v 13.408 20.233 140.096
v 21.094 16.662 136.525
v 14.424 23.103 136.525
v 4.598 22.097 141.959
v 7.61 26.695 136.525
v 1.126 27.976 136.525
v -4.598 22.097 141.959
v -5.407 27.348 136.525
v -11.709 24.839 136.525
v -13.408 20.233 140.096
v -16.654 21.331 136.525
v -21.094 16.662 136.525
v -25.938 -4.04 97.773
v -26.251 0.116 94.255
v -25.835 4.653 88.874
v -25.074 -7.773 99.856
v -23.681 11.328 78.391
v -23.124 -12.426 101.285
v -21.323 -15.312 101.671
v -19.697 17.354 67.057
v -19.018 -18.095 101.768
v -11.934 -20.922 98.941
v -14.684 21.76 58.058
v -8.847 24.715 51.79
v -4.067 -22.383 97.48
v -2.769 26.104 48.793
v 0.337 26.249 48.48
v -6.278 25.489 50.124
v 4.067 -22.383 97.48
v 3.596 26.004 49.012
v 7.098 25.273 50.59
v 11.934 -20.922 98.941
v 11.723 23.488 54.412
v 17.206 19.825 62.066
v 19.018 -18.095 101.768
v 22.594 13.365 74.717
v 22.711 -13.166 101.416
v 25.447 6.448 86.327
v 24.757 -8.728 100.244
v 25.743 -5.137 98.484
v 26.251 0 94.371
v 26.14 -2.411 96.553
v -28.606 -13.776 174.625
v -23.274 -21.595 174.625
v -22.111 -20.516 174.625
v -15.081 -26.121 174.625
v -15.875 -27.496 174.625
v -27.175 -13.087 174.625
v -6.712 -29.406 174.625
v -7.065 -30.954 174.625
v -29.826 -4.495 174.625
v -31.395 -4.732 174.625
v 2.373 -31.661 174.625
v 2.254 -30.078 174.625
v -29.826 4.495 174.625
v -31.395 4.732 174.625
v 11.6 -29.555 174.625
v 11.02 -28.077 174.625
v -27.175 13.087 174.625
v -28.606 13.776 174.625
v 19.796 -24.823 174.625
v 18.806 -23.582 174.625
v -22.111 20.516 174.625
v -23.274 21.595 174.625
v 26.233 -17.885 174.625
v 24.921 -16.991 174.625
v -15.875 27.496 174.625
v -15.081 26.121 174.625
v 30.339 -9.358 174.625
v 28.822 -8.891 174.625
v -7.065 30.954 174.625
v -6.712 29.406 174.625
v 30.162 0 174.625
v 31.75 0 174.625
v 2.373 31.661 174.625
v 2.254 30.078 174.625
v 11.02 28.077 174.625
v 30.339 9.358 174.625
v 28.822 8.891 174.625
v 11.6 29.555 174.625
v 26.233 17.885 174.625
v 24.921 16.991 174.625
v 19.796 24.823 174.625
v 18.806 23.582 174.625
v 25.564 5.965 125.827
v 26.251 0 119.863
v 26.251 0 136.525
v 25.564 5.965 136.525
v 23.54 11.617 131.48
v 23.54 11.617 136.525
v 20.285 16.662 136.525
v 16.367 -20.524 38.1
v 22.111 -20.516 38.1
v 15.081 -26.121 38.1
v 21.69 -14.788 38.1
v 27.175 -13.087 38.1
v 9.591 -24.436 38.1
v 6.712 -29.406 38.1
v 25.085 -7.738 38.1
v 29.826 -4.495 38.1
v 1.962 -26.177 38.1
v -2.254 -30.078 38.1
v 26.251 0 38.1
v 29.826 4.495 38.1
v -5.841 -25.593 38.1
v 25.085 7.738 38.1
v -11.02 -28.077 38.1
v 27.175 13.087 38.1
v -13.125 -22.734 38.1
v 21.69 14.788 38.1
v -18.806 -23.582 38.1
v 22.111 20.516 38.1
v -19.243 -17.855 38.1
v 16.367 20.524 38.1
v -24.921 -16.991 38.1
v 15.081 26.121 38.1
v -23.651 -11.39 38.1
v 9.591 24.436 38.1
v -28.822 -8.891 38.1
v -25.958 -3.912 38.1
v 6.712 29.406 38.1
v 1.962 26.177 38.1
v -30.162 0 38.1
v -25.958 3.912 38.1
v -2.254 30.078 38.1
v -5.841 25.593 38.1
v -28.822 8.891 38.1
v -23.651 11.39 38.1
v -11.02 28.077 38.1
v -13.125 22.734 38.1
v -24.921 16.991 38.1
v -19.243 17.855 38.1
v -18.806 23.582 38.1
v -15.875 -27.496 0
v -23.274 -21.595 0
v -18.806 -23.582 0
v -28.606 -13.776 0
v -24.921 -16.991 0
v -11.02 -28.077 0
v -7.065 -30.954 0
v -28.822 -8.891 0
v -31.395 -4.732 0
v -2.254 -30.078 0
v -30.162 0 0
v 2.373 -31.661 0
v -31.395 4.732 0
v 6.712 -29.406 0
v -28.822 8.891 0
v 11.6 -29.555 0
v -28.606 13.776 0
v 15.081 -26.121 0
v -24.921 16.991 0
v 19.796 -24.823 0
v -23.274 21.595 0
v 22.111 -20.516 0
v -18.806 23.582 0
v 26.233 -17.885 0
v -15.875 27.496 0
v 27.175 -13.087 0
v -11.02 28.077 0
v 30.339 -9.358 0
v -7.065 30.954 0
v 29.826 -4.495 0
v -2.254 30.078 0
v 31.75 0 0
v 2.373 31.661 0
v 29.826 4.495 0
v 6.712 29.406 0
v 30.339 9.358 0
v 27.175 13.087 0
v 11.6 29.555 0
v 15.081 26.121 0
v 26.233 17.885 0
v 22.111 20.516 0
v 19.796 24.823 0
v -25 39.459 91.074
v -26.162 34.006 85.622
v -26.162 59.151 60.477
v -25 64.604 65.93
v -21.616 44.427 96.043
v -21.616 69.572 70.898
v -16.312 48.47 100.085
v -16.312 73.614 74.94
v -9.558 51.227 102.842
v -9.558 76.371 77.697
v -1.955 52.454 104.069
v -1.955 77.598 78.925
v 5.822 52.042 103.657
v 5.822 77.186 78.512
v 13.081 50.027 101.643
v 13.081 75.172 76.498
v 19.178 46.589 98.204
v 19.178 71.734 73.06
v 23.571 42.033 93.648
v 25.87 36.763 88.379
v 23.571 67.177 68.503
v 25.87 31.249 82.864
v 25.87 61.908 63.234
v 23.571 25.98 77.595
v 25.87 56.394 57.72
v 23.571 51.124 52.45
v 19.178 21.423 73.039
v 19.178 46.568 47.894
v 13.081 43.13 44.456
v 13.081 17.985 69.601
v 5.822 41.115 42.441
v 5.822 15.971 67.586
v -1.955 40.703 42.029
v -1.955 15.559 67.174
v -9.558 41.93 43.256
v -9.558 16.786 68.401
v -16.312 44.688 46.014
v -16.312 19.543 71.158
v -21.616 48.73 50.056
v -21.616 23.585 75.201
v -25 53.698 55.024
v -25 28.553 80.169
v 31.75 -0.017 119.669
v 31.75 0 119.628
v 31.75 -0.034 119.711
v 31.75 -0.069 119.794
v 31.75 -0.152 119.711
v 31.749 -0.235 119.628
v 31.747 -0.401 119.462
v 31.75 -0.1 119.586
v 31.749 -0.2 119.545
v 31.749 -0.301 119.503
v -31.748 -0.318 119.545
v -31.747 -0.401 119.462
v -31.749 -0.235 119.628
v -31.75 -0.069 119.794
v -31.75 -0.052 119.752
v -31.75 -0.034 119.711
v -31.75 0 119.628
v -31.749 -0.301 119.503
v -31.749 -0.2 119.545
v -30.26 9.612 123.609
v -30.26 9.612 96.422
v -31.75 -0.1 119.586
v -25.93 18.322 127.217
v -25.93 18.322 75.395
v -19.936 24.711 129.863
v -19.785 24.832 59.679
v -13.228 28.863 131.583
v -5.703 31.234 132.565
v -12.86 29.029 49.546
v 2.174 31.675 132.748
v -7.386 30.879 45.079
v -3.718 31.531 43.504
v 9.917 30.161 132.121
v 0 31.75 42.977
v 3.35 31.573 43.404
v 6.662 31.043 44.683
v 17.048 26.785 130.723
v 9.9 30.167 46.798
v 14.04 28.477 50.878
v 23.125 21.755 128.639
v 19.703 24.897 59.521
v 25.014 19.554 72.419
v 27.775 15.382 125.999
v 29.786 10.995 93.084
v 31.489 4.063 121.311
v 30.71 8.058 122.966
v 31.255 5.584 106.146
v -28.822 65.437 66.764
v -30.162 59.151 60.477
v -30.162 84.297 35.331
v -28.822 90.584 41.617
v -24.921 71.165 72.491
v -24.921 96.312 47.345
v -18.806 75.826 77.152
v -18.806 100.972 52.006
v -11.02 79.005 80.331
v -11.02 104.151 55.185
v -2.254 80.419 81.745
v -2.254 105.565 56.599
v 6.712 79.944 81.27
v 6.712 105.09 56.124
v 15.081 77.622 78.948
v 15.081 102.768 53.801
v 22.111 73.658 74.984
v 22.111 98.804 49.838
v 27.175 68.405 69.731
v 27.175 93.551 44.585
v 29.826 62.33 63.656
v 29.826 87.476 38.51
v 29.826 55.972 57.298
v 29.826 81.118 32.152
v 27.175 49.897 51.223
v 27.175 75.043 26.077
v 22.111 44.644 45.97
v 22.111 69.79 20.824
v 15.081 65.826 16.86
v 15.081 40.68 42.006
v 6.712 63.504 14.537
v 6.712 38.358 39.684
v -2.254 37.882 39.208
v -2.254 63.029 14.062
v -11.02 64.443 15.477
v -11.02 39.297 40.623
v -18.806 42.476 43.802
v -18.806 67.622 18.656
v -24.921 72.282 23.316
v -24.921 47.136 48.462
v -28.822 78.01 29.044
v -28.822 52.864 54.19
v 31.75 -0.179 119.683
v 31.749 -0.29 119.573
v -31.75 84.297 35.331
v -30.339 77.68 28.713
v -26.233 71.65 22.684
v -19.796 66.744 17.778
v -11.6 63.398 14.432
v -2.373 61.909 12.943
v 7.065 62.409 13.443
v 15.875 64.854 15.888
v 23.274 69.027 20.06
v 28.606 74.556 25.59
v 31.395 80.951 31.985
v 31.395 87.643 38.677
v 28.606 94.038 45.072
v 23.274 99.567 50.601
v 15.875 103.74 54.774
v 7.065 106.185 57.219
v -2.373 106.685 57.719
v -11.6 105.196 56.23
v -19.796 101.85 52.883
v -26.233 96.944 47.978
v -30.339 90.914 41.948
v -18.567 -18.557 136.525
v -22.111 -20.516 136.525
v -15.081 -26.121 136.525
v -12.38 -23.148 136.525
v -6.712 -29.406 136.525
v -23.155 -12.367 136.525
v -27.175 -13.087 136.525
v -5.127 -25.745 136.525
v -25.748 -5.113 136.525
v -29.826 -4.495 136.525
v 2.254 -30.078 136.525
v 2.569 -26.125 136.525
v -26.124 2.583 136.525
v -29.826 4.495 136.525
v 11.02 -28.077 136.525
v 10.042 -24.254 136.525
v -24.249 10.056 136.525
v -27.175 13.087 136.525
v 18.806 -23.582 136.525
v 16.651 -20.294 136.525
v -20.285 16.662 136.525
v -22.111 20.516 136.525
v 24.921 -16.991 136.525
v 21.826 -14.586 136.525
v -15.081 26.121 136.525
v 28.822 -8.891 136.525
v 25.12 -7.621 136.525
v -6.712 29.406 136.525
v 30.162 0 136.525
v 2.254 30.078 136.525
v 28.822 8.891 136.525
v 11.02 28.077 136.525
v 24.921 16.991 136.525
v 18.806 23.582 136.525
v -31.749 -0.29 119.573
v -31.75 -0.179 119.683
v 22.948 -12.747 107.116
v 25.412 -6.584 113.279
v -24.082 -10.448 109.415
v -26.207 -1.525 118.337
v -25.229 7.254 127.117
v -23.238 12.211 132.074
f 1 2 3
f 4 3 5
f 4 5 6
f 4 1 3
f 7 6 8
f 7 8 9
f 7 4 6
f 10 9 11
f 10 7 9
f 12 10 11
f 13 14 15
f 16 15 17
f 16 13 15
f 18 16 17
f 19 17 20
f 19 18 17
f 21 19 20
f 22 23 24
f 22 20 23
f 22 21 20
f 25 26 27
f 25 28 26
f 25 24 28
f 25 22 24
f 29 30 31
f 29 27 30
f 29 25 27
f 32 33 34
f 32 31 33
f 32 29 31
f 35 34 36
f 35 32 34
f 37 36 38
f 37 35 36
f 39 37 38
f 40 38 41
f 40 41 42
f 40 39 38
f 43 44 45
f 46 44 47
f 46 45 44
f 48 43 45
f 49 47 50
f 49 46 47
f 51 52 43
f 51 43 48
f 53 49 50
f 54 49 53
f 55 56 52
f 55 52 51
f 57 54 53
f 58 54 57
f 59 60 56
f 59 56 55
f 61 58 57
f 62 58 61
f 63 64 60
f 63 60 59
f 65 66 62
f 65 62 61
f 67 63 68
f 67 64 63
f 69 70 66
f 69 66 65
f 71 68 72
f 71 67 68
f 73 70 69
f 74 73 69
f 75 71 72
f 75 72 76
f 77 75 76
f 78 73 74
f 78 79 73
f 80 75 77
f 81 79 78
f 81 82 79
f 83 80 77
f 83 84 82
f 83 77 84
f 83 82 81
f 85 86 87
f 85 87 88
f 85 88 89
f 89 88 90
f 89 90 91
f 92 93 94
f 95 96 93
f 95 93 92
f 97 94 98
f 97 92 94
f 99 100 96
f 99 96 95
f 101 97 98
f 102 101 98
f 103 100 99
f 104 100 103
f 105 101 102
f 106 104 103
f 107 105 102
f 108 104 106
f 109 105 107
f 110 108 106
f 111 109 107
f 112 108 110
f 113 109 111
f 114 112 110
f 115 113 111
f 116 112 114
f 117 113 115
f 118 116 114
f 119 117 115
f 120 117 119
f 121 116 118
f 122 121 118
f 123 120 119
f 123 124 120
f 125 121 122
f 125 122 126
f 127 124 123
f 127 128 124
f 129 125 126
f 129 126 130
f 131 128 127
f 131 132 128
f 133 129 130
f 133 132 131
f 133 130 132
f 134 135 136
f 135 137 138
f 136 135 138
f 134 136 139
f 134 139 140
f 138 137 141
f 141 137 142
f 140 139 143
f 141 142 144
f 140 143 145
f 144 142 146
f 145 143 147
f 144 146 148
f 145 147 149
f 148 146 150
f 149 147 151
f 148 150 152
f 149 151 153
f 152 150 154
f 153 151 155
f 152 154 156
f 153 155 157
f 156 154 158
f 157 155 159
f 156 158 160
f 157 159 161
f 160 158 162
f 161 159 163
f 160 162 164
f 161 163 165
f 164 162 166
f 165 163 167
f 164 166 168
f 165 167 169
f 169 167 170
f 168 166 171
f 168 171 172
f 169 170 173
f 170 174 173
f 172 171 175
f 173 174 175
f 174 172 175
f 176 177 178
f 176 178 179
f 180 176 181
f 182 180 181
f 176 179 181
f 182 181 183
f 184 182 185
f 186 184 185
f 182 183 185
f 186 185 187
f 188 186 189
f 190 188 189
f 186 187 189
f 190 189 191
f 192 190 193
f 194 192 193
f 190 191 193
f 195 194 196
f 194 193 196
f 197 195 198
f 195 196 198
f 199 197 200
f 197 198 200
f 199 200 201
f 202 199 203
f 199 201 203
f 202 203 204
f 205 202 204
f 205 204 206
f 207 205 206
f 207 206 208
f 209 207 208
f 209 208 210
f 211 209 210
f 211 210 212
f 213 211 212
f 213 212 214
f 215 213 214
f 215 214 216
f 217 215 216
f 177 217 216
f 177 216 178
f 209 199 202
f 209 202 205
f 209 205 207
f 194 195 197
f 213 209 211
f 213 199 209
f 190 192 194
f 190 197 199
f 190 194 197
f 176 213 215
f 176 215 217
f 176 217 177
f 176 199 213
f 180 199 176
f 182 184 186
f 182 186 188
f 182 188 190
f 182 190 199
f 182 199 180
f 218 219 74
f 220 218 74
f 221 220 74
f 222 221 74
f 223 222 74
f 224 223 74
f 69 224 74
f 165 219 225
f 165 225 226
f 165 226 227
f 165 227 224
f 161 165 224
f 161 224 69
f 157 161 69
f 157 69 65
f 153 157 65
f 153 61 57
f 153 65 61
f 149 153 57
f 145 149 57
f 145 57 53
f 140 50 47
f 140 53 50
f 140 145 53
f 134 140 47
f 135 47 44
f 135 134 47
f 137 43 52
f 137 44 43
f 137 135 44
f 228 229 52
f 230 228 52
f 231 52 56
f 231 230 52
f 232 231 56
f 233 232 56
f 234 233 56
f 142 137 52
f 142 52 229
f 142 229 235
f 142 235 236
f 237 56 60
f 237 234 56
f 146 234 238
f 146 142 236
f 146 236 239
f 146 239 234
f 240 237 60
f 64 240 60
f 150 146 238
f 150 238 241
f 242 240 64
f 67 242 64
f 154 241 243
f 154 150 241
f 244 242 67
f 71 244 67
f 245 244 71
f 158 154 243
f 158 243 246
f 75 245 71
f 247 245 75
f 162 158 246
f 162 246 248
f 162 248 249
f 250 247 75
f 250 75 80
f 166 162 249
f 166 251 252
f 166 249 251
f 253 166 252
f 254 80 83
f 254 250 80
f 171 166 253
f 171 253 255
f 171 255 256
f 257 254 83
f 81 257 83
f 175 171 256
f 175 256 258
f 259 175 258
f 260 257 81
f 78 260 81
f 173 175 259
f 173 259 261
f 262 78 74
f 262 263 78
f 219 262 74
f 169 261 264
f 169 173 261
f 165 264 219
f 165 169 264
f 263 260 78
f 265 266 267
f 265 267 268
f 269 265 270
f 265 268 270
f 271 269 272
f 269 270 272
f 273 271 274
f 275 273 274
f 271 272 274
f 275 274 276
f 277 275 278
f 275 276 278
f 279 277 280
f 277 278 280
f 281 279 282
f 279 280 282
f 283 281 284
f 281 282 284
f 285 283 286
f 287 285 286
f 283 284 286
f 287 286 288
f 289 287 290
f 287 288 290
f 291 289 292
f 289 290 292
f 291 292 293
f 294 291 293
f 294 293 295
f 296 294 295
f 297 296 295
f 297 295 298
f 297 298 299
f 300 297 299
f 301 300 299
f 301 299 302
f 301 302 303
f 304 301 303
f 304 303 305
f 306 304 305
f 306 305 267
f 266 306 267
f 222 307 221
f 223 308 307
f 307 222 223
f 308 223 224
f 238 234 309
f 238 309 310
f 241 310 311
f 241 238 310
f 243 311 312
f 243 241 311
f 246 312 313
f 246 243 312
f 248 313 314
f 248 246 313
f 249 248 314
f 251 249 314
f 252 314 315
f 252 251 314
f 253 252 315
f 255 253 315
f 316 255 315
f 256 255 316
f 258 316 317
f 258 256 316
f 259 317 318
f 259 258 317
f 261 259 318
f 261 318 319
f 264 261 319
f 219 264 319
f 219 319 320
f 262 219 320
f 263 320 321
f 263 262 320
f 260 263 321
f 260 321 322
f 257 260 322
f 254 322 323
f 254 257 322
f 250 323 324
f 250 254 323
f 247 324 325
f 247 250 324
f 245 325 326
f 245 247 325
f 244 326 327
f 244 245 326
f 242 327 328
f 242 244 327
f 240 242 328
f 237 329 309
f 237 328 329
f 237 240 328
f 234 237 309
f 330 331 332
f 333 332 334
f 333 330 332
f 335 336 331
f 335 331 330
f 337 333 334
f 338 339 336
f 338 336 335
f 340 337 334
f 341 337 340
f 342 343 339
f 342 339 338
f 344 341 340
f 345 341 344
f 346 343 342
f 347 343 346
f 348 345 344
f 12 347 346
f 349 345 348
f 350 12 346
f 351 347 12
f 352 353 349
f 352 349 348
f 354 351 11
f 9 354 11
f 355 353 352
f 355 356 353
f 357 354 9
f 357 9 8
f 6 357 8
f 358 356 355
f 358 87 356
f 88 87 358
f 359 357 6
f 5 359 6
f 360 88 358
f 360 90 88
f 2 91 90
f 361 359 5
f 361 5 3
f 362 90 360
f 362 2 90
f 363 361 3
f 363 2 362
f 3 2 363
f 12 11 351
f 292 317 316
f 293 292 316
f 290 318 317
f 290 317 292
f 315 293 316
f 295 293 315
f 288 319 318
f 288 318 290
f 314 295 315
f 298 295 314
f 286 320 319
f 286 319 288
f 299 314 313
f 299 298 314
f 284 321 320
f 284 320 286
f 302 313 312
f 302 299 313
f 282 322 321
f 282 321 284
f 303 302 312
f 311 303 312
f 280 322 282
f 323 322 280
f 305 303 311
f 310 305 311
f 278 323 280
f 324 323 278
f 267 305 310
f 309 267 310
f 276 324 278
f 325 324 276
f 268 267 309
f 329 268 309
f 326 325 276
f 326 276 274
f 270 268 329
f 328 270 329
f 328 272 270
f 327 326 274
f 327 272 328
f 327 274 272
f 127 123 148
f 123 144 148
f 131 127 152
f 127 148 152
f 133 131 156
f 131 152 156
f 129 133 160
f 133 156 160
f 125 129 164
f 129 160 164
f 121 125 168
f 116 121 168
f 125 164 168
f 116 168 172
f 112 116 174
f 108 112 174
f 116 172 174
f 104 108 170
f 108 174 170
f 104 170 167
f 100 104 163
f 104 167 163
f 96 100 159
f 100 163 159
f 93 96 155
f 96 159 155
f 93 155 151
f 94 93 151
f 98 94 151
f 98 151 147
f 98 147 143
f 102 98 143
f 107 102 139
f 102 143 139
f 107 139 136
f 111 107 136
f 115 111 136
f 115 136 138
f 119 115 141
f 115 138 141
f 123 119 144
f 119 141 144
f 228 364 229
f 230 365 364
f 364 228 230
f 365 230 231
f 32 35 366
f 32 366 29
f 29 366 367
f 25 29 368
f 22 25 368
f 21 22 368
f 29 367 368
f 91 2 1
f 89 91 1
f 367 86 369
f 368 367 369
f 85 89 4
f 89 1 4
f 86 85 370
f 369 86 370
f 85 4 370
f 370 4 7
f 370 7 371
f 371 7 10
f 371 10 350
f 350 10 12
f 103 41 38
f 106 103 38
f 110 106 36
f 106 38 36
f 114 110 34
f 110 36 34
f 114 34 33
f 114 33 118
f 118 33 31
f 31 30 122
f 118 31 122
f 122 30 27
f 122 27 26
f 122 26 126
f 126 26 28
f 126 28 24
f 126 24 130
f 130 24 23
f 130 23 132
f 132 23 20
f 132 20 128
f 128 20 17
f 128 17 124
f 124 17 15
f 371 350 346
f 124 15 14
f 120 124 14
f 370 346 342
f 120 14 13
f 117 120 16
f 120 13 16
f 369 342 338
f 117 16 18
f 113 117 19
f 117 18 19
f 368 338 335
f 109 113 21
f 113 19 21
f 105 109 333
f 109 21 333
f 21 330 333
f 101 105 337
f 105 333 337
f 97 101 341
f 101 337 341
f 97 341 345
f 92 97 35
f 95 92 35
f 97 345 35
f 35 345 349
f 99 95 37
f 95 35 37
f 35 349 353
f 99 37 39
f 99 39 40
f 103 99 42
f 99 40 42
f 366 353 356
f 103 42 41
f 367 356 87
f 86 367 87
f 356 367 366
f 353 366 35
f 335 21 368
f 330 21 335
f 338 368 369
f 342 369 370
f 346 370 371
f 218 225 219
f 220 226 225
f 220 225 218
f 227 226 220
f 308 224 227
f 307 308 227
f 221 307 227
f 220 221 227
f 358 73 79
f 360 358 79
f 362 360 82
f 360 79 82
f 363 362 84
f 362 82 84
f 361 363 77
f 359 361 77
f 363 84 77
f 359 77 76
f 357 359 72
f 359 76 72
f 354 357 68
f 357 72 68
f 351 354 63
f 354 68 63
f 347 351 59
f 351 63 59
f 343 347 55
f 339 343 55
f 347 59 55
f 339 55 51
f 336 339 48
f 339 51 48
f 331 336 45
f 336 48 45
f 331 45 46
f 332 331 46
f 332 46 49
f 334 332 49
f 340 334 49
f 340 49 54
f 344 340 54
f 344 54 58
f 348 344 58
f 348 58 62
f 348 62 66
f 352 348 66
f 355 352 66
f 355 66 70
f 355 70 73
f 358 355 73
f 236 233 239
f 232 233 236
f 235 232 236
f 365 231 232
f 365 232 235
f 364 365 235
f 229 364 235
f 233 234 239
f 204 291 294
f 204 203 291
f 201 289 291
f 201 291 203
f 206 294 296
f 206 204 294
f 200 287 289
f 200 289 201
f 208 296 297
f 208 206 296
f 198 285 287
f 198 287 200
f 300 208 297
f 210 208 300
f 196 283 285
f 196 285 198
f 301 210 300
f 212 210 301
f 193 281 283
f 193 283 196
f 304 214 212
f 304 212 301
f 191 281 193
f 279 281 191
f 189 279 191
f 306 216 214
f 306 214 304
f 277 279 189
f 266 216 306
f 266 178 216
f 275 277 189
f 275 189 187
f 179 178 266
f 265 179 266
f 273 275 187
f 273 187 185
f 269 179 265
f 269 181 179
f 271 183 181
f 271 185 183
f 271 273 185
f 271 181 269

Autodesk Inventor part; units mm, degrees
ref_plane "YZ Plane" through (0, 0, 0) normal (1, 0, 0) x (0, 1, 0)
ref_plane "XZ Plane" through (0, 0, 0) normal (0, 1, 0) x (-1, 0, 0)
sketch "Sketch1" plane through (0, 0, 0) normal (0, 0, 1) x (1, 0, 0)
  circle A0 centre (0, 0) radius 31.75
  dimension "d0" = 63.5
extrude "Extrusion1" add sketch "Sketch1" along normal blind 174.625
sketch "Sketch2" plane through (0, 0, 174.625) normal (0, 0, 1) x (1, 0, 0)
  circle A0 centre (0, 0) radius 31.75 projected
  circle A1 centre (0, 0) radius 26.2509
  dimension "d3" = 52.5018
extrude "Extrusion2" cut sketch "Sketch2" against normal blind 174.625 contours A1
sketch "Sketch3" plane through (0, 0, 174.625) normal (0, 0, 1) x (1, 0, 0)
  circle A0 centre (0, 0) radius 26.2509 projected
  circle A1 centre (0, 0) radius 31.75 projected
  circle A2 centre (0, 0) radius 30.1625
  dimension "d7" = 60.325
extrude "Extrusion3" cut sketch "Sketch3" against normal blind 38.1 contours A2
sketch "Sketch4" plane through (0, 0, 0) normal (0, 0, -1) x (-1, 0, 0)
  circle A0 centre (0, 0) radius 26.2509 projected
  circle A1 centre (0, 0) radius 31.75 projected
  circle A2 centre (0, 0) radius 30.1625
  dimension "d11" = 60.325
extrude "Extrusion4" cut sketch "Sketch4" against normal blind 38.1 contours A2
sketch "Sketch5" plane through (0, 0, 0) normal (0, 0, -1) x (-1, 0, 0)
  circle A0 centre (0, 0) radius 30.1625 projected
  circle A1 centre (0, 0) radius 31.75 projected
  point P0 (0, 31.75)
ref_plane "Work Plane2" through (0, 0, 0) normal (0, 1, 0) x (-1, 0, 0)
ref_plane "Work Plane1" through (0, 31.75, 0) normal (0, 1, 0) x (-1, 0, 0)
sketch "Sketch6" plane through (0, 0, 0) normal (0, 1, 0) x (-1, 0, 0)
  line L0 (-19.7324, 119.8626) -> (17.0407, 119.8626) construction
  line L1 (-30.1625, 174.625) -> (30.1625, 174.625) construction
  point P0 (0, 0)
  dimension "d15" = 54.7624
ref_plane "Work Plane3" through (19.7324, 0, 119.8626) normal (0, 0.7071, -0.7071) x (-1, 0, 0)
sketch "Sketch7" plane through (19.7324, 0, 119.8626) normal (0, 0.7071, -0.7071) x (-1, 0, 0)
  circle A0 centre (19.7324, -0.166) radius 31.75
  point P0 (19.7324, -84.7557)
  dimension "d18" = 63.5
extrude "Extrusion5" add sketch "Sketch7" along normal blind 119.38
sketch "Sketch8" plane through (0, 84.297, 35.3308) normal (0, 0.7071, -0.7071) x (-1, 0, 0)
  circle A0 centre (0, 0) radius 31.75 projected
  circle A1 centre (0, 0) radius 30.1625
  point P0 (0, -84.5897)
  dimension "d21" = 60.325
extrude "Extrusion6" cut sketch "Sketch8" against normal blind 35.56 contours A1
sketch "Sketch9" plane through (0, 59.1523, 60.4755) normal (0, 0.7071, -0.7071) x (-1, 0, 0)
  circle A0 centre (0, 0) radius 30.1625 projected
  circle A1 centre (0, 0) radius 26.162
  point P0 (0, -84.5897)
  dimension "d24" = 52.324
extrude "Extrusion8" cut sketch "Sketch9" against normal blind 35.56 contours A1
properties part number "sup-wye" material "PVC-Piping"
